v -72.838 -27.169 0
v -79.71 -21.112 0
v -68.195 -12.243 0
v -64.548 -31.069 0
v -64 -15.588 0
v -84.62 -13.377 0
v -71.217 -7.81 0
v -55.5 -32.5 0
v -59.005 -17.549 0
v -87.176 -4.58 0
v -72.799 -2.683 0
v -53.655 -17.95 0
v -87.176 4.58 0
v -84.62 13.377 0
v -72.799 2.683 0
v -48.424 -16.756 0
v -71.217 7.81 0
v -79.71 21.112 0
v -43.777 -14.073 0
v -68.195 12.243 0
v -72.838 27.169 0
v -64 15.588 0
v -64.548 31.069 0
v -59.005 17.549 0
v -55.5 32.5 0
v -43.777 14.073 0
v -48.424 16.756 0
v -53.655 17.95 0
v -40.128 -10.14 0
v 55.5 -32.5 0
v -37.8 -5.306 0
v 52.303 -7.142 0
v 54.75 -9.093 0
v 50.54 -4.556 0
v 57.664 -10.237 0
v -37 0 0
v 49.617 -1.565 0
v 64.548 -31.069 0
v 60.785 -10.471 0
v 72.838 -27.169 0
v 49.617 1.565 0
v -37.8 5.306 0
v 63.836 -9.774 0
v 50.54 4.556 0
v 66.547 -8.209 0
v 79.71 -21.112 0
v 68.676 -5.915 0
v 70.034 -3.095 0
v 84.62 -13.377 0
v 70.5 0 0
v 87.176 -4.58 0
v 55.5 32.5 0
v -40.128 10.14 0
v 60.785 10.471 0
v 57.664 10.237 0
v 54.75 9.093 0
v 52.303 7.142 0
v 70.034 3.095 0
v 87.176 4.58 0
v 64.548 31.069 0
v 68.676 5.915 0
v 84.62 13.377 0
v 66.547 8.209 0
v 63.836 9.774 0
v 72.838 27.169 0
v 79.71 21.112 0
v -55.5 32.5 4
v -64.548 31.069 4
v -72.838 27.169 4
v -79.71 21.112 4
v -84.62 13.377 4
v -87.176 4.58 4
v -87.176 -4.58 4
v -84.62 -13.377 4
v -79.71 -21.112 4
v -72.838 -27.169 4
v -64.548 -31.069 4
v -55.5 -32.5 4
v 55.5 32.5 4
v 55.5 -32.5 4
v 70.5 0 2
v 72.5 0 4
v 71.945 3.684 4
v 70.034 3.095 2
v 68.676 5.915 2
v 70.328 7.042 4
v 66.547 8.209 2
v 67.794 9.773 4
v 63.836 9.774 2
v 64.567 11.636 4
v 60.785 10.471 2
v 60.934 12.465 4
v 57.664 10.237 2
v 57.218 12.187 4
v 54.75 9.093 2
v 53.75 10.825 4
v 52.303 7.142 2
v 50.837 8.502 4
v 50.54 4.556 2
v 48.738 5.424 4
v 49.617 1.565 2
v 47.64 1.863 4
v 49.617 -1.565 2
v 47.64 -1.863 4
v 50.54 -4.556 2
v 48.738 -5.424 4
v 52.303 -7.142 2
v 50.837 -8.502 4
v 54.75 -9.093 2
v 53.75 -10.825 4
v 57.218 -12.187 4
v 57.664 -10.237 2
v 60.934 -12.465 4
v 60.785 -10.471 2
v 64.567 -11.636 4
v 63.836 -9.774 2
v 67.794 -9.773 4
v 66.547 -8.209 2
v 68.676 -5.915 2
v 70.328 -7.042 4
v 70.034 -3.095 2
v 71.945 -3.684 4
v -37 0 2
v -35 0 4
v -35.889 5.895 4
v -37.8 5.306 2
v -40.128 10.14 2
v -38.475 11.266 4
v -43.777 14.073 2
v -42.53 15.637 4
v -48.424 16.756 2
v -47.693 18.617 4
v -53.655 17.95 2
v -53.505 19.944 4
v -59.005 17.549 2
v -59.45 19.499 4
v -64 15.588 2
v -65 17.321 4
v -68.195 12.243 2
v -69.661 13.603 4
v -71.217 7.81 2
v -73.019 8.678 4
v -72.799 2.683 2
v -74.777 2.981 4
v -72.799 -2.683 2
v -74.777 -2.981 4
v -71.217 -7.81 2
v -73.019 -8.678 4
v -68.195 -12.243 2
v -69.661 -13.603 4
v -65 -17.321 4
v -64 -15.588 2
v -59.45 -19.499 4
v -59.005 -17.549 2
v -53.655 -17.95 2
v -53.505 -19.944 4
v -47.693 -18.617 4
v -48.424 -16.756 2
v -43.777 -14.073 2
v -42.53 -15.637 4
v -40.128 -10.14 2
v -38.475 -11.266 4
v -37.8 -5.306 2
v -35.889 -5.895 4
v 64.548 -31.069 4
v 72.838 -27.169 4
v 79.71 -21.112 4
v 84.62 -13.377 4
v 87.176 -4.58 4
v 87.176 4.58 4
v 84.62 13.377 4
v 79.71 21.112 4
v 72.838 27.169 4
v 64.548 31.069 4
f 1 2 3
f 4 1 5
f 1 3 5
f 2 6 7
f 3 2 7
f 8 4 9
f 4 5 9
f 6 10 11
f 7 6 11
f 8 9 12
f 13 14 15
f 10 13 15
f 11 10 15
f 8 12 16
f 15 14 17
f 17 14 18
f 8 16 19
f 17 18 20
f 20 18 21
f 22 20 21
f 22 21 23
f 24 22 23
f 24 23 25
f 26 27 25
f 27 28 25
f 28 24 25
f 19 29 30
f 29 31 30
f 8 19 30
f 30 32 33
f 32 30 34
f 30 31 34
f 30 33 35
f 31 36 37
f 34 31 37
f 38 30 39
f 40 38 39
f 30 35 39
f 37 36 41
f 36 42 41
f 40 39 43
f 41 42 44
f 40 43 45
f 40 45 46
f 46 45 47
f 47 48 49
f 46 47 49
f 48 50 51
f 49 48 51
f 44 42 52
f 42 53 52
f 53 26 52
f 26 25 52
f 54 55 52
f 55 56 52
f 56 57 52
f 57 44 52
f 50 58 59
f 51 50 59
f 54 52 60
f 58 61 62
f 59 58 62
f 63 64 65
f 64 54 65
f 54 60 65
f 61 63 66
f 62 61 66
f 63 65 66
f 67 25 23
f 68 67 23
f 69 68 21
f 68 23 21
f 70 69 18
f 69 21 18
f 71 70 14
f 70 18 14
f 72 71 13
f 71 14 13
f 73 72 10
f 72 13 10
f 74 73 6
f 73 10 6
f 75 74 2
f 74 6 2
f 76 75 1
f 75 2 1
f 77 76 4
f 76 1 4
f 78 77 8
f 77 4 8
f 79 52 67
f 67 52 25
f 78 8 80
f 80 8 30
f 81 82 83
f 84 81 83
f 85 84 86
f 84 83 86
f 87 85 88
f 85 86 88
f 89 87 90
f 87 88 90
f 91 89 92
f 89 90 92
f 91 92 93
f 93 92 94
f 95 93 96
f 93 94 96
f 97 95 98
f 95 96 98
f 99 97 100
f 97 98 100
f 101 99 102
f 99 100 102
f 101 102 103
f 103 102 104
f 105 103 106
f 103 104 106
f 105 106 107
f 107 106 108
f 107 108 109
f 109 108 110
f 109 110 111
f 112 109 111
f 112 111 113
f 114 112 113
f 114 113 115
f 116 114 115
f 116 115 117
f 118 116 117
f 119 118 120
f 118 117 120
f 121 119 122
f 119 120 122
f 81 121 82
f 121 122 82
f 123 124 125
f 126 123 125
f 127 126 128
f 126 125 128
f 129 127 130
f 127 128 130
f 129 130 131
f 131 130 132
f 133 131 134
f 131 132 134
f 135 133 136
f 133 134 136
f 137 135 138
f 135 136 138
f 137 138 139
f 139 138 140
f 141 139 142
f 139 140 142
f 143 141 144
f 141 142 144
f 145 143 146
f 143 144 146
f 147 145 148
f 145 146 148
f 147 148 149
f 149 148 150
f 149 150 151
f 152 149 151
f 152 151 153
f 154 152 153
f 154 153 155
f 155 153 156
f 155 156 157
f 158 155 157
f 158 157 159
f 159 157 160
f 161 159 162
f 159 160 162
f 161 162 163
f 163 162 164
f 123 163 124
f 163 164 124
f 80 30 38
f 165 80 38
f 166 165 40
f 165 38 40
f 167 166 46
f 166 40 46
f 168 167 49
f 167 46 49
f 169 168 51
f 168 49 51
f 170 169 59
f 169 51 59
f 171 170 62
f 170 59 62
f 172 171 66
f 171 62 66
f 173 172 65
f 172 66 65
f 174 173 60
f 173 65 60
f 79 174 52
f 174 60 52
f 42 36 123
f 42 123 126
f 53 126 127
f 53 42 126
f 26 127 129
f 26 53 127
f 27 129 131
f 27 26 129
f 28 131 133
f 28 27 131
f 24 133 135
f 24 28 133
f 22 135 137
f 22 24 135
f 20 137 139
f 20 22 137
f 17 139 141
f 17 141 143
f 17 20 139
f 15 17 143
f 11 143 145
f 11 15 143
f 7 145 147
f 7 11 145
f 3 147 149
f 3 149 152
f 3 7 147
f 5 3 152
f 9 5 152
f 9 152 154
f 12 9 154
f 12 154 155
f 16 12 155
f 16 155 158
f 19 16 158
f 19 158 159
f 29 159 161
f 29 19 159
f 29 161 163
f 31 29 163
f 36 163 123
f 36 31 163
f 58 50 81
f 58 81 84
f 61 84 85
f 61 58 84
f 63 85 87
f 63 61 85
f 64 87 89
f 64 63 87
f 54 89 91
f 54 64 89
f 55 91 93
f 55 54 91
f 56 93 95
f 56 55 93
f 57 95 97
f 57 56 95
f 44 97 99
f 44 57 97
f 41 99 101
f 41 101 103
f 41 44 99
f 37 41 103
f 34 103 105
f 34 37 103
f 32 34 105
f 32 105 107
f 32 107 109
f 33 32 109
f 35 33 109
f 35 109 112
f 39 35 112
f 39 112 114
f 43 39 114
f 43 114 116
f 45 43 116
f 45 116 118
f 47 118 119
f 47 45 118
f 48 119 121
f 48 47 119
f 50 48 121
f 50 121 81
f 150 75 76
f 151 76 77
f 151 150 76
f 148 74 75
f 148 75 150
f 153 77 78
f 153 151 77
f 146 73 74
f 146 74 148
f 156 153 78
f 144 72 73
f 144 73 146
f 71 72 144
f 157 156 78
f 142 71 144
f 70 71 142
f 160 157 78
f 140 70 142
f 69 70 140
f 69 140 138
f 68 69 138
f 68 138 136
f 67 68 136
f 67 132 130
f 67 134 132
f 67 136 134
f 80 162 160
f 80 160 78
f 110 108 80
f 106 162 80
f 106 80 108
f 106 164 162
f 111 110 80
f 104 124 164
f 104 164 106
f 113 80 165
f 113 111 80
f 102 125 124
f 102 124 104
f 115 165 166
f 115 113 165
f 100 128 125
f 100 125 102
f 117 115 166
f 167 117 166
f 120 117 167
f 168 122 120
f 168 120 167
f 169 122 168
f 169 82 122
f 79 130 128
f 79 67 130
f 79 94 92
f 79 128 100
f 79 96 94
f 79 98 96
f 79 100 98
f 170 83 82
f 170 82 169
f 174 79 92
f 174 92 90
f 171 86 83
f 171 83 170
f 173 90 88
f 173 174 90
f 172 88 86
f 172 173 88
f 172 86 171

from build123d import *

# Parameters (mm, degrees)
F0_R     = 18
F0_R_2   = 10.5
F1_DEPTH = 4
F2_SIZE  = 2


# Not quite as in the source:
# - a feature names something its author has since deleted; it is built from what else it names


with BuildPart() as f1:
    # F0 (on Top) → F1 (new body)
    with BuildSketch(Plane.XY):
        with BuildLine():
            ThreePointArc((-55.5, 32.5), (-87.5, 0), (-55.5, -32.5))
            Line((-55.5, -32.5), (55.5, -32.5))
            ThreePointArc((55.5, -32.5), (87.5, 0), (55.5, 32.5))
            Line((55.5, 32.5), (-55.5, 32.5))
        make_face()
        with Locations((-55, 0)):
            Circle(F0_R, mode=Mode.SUBTRACT)
        with Locations((60, 0)):
            Circle(F0_R_2, mode=Mode.SUBTRACT)
    extrude(amount=F1_DEPTH)

    # F2
    f2_edges = [f1.edges().sort_by_distance(p)[0] for p in [
        (-73, 0, 4),
        (49.5, 0, 4),
    ]]
    chamfer(f2_edges, length=F2_SIZE)


solid = f1.part
